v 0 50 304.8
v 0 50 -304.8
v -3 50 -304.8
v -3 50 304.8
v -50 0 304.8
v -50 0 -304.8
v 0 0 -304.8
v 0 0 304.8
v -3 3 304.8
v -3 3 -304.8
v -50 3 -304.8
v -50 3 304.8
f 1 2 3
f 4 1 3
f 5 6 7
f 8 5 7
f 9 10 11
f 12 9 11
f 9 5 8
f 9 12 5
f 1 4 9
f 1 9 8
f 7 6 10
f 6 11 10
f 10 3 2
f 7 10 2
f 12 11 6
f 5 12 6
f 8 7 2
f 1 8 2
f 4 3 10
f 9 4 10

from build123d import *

# Parameters (mm, degrees)
BOSS_EXTRUDE1_DEPTH      = 304.8
BOSS_EXTRUDE1_DEPTH_BACK = 304.8


with BuildPart() as part:
    # Sketch3 → Boss-Extrude1 (new, two sides: drawn at the far end of the back side and taken through both)
    with BuildSketch(Plane.XY.offset(-BOSS_EXTRUDE1_DEPTH_BACK)):
        Polygon((-50, 0), (0, 0), (0, 50), (-3, 50), (-3, 3), (-50, 3), align=None)
    extrude(amount=BOSS_EXTRUDE1_DEPTH + BOSS_EXTRUDE1_DEPTH_BACK)


solid = part.part
